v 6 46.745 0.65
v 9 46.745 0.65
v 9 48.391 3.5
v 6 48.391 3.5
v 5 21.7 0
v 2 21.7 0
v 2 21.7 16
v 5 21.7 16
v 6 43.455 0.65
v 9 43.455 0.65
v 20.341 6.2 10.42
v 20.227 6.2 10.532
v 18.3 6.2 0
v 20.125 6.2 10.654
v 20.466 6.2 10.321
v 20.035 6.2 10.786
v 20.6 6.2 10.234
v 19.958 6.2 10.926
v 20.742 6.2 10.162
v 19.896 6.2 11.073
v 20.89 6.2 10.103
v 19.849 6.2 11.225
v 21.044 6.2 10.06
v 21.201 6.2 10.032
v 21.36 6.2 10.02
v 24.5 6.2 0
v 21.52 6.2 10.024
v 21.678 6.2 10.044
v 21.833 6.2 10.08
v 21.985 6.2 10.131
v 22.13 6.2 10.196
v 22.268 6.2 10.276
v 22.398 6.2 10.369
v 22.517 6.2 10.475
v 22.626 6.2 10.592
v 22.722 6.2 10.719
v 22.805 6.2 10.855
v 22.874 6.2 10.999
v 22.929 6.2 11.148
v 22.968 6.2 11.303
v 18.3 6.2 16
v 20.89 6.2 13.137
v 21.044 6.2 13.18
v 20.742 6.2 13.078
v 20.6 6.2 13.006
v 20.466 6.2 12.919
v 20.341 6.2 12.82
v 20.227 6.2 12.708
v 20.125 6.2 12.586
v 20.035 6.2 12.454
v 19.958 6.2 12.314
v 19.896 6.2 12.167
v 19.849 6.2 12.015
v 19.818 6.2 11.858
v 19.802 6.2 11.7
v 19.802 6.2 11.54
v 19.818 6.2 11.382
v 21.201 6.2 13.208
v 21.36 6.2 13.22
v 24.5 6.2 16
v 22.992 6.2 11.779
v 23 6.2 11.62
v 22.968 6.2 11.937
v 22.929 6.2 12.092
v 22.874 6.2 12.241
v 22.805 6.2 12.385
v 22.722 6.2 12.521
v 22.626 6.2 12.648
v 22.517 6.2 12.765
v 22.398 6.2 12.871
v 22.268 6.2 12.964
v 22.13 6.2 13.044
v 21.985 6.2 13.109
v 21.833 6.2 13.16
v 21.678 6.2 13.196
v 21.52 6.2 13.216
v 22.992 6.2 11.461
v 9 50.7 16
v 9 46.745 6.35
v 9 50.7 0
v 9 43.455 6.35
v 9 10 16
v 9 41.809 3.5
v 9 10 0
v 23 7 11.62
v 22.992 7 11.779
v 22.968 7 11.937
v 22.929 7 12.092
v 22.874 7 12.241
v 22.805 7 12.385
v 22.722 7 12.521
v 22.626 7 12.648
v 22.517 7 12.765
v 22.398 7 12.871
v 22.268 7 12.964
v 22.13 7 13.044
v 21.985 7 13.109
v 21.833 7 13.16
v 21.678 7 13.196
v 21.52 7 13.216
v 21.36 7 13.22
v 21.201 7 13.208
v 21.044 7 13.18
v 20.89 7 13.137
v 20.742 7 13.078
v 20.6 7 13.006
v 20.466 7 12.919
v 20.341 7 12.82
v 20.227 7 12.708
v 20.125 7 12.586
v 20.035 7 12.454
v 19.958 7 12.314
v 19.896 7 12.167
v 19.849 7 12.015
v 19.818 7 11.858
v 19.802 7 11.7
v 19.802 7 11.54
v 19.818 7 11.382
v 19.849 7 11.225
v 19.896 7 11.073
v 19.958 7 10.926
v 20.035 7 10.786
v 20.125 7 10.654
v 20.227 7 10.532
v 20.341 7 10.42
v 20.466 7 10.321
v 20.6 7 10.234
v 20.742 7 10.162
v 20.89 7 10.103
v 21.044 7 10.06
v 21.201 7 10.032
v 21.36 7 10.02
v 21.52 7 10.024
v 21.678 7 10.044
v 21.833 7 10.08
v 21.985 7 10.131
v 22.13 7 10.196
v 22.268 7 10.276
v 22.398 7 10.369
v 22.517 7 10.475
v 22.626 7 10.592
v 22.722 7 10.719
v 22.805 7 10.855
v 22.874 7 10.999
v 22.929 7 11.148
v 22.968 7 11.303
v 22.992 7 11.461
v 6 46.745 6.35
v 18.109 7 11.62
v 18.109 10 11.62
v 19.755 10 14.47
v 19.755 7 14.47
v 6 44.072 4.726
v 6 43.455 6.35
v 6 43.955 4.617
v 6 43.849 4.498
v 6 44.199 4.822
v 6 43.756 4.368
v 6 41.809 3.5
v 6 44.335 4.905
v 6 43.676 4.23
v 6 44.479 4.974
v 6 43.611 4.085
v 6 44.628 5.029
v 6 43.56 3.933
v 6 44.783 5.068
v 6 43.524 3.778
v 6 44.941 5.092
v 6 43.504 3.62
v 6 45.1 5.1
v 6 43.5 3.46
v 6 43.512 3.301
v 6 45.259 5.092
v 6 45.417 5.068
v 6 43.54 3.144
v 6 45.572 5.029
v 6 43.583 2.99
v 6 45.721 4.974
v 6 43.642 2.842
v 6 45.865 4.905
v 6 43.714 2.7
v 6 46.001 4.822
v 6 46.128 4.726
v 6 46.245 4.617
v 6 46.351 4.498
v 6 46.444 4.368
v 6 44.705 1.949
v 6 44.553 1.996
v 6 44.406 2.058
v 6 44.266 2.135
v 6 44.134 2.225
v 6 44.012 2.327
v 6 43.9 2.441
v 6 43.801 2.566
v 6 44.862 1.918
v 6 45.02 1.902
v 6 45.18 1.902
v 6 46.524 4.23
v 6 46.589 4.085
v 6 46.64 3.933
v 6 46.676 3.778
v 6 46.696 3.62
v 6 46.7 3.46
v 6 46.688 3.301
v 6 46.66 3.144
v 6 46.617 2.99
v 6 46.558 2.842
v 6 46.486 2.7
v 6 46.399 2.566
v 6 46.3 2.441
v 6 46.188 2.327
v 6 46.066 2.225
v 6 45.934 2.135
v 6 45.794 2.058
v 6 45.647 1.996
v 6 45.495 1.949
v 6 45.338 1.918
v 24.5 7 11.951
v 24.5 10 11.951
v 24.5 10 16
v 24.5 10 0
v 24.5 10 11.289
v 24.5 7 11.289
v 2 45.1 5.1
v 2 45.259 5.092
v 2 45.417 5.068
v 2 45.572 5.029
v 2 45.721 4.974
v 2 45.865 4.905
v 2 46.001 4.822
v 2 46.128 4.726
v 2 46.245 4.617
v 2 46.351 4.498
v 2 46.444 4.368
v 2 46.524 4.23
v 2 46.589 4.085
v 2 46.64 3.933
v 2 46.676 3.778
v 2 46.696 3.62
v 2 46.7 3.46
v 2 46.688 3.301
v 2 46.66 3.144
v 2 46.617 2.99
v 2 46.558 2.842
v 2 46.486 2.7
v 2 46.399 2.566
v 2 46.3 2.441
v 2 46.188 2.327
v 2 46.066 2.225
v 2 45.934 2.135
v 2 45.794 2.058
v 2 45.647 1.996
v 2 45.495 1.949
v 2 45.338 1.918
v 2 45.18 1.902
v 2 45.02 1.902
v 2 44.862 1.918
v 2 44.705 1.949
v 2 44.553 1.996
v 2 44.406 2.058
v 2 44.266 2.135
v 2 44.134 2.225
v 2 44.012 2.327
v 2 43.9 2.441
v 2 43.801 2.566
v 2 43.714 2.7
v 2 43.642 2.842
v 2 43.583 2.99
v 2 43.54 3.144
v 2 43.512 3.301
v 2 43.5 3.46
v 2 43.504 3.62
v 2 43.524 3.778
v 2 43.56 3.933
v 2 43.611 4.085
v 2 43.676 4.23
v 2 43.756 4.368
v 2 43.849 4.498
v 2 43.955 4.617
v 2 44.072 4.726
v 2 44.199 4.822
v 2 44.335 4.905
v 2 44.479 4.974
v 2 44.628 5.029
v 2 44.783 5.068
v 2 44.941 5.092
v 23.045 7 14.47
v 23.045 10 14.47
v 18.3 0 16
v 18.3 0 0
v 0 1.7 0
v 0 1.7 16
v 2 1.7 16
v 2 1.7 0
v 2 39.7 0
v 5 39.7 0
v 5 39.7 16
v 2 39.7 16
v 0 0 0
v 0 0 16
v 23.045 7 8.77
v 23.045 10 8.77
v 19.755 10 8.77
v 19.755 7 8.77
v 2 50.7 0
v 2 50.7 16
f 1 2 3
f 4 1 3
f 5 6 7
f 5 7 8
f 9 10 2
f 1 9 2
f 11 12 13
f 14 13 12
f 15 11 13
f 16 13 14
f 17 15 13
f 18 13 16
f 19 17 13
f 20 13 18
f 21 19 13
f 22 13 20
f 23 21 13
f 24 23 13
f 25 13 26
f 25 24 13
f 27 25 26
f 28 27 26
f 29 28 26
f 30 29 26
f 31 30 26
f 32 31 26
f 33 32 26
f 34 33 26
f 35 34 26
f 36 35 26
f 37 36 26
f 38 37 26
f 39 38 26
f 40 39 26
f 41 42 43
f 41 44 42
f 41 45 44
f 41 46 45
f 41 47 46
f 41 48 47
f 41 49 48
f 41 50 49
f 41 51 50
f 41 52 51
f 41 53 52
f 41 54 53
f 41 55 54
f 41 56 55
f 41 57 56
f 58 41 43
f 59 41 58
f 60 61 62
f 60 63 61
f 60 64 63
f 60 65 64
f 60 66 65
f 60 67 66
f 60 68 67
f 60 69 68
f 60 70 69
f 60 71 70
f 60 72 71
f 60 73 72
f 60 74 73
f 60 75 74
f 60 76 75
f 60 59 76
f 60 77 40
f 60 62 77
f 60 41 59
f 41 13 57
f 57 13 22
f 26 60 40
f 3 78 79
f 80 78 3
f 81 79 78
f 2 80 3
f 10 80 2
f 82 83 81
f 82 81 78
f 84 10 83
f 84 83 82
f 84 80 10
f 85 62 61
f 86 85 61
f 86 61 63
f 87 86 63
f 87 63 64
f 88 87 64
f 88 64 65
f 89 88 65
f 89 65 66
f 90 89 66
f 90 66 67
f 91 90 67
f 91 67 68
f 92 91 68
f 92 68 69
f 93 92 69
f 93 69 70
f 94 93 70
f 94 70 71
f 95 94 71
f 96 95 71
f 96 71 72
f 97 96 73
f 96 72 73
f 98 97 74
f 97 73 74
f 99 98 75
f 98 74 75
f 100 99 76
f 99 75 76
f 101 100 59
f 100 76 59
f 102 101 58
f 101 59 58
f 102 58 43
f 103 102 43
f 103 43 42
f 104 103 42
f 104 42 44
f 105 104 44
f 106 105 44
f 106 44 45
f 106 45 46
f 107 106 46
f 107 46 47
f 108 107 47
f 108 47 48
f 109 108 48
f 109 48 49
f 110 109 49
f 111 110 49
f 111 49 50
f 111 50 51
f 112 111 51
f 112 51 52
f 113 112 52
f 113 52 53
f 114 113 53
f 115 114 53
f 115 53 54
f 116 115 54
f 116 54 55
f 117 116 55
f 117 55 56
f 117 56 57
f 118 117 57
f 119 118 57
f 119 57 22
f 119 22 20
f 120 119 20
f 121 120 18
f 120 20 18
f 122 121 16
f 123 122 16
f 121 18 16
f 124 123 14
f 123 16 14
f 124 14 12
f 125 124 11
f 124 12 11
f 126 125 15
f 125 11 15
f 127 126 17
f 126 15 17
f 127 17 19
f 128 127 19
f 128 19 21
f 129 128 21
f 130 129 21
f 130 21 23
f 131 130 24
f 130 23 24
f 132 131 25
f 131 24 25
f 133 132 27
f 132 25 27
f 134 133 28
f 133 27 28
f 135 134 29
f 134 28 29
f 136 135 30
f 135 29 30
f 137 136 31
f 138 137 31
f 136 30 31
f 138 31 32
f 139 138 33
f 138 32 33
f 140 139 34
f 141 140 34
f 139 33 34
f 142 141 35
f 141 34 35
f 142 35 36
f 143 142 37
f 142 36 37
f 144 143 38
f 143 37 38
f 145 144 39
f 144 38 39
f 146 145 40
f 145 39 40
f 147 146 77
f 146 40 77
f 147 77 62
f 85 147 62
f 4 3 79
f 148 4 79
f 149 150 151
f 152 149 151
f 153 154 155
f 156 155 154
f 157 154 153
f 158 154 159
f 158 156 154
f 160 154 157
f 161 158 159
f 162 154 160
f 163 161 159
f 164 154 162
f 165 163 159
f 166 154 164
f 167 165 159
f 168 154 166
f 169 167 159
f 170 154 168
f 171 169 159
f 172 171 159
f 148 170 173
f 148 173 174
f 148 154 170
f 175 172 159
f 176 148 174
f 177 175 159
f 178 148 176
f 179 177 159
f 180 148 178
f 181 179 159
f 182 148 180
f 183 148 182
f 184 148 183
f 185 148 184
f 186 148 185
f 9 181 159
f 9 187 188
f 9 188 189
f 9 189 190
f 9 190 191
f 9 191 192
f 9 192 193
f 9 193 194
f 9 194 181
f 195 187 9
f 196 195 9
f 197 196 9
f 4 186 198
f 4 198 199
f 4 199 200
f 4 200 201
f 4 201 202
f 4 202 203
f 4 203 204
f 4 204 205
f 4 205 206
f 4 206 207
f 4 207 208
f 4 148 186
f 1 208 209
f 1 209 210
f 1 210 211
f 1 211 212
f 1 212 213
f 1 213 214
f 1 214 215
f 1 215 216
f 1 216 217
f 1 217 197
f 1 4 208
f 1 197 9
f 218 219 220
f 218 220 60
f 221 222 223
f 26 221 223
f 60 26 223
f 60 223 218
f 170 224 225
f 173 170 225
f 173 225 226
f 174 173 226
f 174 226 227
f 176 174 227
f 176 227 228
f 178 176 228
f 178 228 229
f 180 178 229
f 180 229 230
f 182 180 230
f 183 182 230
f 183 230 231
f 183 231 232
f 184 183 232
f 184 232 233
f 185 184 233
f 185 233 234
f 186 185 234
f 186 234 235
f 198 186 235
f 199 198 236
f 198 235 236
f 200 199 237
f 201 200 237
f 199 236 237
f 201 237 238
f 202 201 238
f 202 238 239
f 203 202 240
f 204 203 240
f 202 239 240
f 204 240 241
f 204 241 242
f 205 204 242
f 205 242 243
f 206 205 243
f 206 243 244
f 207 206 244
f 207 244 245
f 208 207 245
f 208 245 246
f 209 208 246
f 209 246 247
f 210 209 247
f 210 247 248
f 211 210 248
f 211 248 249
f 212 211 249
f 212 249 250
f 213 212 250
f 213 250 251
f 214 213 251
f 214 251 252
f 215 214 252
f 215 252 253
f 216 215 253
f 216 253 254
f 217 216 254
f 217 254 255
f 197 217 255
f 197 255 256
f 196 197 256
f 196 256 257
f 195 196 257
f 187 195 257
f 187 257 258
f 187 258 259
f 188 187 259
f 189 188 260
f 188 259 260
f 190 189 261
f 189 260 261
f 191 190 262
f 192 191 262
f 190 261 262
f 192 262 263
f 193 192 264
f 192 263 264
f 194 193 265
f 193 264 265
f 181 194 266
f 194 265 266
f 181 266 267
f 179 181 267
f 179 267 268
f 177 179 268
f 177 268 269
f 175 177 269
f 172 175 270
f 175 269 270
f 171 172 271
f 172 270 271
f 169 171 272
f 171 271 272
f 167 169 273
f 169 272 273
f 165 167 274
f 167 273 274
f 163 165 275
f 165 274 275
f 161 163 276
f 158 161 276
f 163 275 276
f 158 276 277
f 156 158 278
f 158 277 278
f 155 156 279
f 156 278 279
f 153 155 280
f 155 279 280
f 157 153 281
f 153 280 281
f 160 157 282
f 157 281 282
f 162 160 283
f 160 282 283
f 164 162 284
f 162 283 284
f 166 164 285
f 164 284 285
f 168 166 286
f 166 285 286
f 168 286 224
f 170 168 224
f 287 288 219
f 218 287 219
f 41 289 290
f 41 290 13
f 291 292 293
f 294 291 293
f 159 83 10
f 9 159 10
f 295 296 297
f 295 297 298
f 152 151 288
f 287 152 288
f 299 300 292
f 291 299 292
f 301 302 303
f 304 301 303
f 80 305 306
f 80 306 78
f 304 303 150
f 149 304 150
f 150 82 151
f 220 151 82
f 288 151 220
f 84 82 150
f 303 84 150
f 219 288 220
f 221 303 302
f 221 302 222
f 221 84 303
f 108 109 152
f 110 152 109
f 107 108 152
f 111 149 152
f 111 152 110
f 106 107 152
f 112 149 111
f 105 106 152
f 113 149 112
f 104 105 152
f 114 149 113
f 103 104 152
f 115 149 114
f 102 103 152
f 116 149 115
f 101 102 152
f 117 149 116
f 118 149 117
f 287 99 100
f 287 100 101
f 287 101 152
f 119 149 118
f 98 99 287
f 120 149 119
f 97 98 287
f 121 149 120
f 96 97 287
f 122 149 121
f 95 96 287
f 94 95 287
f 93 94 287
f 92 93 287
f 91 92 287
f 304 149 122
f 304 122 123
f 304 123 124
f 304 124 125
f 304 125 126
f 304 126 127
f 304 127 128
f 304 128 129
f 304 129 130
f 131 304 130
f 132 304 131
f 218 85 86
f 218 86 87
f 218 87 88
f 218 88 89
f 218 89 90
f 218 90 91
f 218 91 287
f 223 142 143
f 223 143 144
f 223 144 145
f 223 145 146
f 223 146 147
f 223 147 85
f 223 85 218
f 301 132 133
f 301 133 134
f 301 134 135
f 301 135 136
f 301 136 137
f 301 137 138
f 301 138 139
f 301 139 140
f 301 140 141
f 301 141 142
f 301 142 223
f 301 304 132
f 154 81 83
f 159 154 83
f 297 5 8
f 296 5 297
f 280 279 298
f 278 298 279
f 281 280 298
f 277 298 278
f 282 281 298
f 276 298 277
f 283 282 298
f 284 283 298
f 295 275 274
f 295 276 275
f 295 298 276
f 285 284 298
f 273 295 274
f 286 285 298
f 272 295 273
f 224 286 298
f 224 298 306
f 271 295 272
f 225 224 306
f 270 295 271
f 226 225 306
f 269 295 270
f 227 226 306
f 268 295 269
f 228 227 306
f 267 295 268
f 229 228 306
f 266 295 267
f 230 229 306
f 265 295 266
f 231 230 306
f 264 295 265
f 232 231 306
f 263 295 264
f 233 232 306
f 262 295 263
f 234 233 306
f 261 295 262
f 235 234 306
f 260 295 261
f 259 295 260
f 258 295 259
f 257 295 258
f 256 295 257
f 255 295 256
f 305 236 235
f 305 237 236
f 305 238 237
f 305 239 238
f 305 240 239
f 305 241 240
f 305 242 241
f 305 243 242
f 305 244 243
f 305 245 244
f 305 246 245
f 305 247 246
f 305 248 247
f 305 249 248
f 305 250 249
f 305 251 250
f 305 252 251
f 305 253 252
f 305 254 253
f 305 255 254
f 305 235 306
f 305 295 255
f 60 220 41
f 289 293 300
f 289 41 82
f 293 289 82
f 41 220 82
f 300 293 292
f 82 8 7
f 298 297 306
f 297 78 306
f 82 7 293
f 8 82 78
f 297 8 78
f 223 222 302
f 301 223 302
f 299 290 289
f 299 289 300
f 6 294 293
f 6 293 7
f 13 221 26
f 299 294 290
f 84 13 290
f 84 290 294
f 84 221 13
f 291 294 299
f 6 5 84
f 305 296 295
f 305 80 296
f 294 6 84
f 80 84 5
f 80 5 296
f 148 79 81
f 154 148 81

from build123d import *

# Parameters (mm, degrees)
SALIENTE_EXTRUIR1_DEPTH = 16
CORTAR_EXTRUIR1_REACH   = 18
CROQUIS2_W              = 6.2
CROQUIS2_H              = 6.2
CORTAR_EXTRUIR2_REACH   = 24.5
CROQUIS3_R              = 1.6
CORTAR_EXTRUIR3_DEPTH   = 3
CORTAR_EXTRUIR4_REACH   = 46.5
CROQUIS5_R              = 1.6
CORTAR_EXTRUIR5_DEPTH   = 3


with BuildPart() as part:
    # Croquis1 → Saliente-Extruir1 (new body)
    with BuildSketch(Plane.XY):
        Polygon((0, 0), (0, 1.7), (2, 1.7), (2, 21.7), (5, 21.7), (5, 39.7), (2, 39.7), (2, 50.7), (9, 50.7), (9, 10), (24.5, 10), (24.5, 0), align=None)
    extrude(amount=SALIENTE_EXTRUIR1_DEPTH)

    # Croquis2 → Cortar-Extruir1 (cut, up to next)
    with BuildSketch(Plane.XY.offset(16), mode=Mode.PRIVATE) as cortar_extruir1_sk1:
        with Locations((21.4, 3.1)):
            Rectangle(CROQUIS2_W, CROQUIS2_H)
    cortar_extruir1_tool1 = extrude(cortar_extruir1_sk1.sketch, amount=-CORTAR_EXTRUIR1_REACH, mode=Mode.PRIVATE) & part.part
    add(cortar_extruir1_tool1.solids().sort_by_distance((21.4, 3.1, 16))[0], mode=Mode.SUBTRACT)

    # Croquis3 → Cortar-Extruir2 (cut, up to next)
    with BuildSketch(Plane.ZY.offset(-2), mode=Mode.PRIVATE) as cortar_extruir2_sk1:
        with Locations((3.5, 45.1)):
            Circle(CROQUIS3_R)
    cortar_extruir2_tool1 = extrude(cortar_extruir2_sk1.sketch, amount=-CORTAR_EXTRUIR2_REACH, mode=Mode.PRIVATE) & part.part
    add(cortar_extruir2_tool1.solids().sort_by_distance((2, 45.1, 3.5))[0], mode=Mode.SUBTRACT)

    # Croquis4 → Cortar-Extruir3 (cut)
    with BuildSketch(Plane(origin=(9, 0, 0), x_dir=(0, 0, -1), z_dir=(1, 0, 0))):
        Polygon((-0.65, 46.745448267), (-3.5, 48.390896534), (-6.35, 46.745448267), (-6.35, 43.454551733), (-3.5, 41.809103466), (-0.65, 43.454551733), align=None)
    extrude(amount=-CORTAR_EXTRUIR3_DEPTH, mode=Mode.SUBTRACT)

    # Croquis5 → Cortar-Extruir4 (cut, up to next)
    with BuildSketch(Plane.XZ.offset(-6.2), mode=Mode.PRIVATE) as cortar_extruir4_sk1:
        with Locations((21.4, 11.62)):
            Circle(CROQUIS5_R)
    cortar_extruir4_tool1 = extrude(cortar_extruir4_sk1.sketch, amount=-CORTAR_EXTRUIR4_REACH, mode=Mode.PRIVATE) & part.part
    add(cortar_extruir4_tool1.solids().sort_by_distance((21.4, 6.2, 11.62))[0], mode=Mode.SUBTRACT)

    # Croquis6 → Cortar-Extruir5 (cut)
    with BuildSketch(Plane(origin=(0, 10, 0), x_dir=(1, 0, 0), z_dir=(0, 1, 0))):
        Polygon((19.754551733, -14.47), (23.045448267, -14.47), (24.690896534, -11.62), (23.045448267, -8.77), (19.754551733, -8.77), (18.109103466, -11.62), align=None)
    extrude(amount=-CORTAR_EXTRUIR5_DEPTH, mode=Mode.SUBTRACT)


solid = part.part
